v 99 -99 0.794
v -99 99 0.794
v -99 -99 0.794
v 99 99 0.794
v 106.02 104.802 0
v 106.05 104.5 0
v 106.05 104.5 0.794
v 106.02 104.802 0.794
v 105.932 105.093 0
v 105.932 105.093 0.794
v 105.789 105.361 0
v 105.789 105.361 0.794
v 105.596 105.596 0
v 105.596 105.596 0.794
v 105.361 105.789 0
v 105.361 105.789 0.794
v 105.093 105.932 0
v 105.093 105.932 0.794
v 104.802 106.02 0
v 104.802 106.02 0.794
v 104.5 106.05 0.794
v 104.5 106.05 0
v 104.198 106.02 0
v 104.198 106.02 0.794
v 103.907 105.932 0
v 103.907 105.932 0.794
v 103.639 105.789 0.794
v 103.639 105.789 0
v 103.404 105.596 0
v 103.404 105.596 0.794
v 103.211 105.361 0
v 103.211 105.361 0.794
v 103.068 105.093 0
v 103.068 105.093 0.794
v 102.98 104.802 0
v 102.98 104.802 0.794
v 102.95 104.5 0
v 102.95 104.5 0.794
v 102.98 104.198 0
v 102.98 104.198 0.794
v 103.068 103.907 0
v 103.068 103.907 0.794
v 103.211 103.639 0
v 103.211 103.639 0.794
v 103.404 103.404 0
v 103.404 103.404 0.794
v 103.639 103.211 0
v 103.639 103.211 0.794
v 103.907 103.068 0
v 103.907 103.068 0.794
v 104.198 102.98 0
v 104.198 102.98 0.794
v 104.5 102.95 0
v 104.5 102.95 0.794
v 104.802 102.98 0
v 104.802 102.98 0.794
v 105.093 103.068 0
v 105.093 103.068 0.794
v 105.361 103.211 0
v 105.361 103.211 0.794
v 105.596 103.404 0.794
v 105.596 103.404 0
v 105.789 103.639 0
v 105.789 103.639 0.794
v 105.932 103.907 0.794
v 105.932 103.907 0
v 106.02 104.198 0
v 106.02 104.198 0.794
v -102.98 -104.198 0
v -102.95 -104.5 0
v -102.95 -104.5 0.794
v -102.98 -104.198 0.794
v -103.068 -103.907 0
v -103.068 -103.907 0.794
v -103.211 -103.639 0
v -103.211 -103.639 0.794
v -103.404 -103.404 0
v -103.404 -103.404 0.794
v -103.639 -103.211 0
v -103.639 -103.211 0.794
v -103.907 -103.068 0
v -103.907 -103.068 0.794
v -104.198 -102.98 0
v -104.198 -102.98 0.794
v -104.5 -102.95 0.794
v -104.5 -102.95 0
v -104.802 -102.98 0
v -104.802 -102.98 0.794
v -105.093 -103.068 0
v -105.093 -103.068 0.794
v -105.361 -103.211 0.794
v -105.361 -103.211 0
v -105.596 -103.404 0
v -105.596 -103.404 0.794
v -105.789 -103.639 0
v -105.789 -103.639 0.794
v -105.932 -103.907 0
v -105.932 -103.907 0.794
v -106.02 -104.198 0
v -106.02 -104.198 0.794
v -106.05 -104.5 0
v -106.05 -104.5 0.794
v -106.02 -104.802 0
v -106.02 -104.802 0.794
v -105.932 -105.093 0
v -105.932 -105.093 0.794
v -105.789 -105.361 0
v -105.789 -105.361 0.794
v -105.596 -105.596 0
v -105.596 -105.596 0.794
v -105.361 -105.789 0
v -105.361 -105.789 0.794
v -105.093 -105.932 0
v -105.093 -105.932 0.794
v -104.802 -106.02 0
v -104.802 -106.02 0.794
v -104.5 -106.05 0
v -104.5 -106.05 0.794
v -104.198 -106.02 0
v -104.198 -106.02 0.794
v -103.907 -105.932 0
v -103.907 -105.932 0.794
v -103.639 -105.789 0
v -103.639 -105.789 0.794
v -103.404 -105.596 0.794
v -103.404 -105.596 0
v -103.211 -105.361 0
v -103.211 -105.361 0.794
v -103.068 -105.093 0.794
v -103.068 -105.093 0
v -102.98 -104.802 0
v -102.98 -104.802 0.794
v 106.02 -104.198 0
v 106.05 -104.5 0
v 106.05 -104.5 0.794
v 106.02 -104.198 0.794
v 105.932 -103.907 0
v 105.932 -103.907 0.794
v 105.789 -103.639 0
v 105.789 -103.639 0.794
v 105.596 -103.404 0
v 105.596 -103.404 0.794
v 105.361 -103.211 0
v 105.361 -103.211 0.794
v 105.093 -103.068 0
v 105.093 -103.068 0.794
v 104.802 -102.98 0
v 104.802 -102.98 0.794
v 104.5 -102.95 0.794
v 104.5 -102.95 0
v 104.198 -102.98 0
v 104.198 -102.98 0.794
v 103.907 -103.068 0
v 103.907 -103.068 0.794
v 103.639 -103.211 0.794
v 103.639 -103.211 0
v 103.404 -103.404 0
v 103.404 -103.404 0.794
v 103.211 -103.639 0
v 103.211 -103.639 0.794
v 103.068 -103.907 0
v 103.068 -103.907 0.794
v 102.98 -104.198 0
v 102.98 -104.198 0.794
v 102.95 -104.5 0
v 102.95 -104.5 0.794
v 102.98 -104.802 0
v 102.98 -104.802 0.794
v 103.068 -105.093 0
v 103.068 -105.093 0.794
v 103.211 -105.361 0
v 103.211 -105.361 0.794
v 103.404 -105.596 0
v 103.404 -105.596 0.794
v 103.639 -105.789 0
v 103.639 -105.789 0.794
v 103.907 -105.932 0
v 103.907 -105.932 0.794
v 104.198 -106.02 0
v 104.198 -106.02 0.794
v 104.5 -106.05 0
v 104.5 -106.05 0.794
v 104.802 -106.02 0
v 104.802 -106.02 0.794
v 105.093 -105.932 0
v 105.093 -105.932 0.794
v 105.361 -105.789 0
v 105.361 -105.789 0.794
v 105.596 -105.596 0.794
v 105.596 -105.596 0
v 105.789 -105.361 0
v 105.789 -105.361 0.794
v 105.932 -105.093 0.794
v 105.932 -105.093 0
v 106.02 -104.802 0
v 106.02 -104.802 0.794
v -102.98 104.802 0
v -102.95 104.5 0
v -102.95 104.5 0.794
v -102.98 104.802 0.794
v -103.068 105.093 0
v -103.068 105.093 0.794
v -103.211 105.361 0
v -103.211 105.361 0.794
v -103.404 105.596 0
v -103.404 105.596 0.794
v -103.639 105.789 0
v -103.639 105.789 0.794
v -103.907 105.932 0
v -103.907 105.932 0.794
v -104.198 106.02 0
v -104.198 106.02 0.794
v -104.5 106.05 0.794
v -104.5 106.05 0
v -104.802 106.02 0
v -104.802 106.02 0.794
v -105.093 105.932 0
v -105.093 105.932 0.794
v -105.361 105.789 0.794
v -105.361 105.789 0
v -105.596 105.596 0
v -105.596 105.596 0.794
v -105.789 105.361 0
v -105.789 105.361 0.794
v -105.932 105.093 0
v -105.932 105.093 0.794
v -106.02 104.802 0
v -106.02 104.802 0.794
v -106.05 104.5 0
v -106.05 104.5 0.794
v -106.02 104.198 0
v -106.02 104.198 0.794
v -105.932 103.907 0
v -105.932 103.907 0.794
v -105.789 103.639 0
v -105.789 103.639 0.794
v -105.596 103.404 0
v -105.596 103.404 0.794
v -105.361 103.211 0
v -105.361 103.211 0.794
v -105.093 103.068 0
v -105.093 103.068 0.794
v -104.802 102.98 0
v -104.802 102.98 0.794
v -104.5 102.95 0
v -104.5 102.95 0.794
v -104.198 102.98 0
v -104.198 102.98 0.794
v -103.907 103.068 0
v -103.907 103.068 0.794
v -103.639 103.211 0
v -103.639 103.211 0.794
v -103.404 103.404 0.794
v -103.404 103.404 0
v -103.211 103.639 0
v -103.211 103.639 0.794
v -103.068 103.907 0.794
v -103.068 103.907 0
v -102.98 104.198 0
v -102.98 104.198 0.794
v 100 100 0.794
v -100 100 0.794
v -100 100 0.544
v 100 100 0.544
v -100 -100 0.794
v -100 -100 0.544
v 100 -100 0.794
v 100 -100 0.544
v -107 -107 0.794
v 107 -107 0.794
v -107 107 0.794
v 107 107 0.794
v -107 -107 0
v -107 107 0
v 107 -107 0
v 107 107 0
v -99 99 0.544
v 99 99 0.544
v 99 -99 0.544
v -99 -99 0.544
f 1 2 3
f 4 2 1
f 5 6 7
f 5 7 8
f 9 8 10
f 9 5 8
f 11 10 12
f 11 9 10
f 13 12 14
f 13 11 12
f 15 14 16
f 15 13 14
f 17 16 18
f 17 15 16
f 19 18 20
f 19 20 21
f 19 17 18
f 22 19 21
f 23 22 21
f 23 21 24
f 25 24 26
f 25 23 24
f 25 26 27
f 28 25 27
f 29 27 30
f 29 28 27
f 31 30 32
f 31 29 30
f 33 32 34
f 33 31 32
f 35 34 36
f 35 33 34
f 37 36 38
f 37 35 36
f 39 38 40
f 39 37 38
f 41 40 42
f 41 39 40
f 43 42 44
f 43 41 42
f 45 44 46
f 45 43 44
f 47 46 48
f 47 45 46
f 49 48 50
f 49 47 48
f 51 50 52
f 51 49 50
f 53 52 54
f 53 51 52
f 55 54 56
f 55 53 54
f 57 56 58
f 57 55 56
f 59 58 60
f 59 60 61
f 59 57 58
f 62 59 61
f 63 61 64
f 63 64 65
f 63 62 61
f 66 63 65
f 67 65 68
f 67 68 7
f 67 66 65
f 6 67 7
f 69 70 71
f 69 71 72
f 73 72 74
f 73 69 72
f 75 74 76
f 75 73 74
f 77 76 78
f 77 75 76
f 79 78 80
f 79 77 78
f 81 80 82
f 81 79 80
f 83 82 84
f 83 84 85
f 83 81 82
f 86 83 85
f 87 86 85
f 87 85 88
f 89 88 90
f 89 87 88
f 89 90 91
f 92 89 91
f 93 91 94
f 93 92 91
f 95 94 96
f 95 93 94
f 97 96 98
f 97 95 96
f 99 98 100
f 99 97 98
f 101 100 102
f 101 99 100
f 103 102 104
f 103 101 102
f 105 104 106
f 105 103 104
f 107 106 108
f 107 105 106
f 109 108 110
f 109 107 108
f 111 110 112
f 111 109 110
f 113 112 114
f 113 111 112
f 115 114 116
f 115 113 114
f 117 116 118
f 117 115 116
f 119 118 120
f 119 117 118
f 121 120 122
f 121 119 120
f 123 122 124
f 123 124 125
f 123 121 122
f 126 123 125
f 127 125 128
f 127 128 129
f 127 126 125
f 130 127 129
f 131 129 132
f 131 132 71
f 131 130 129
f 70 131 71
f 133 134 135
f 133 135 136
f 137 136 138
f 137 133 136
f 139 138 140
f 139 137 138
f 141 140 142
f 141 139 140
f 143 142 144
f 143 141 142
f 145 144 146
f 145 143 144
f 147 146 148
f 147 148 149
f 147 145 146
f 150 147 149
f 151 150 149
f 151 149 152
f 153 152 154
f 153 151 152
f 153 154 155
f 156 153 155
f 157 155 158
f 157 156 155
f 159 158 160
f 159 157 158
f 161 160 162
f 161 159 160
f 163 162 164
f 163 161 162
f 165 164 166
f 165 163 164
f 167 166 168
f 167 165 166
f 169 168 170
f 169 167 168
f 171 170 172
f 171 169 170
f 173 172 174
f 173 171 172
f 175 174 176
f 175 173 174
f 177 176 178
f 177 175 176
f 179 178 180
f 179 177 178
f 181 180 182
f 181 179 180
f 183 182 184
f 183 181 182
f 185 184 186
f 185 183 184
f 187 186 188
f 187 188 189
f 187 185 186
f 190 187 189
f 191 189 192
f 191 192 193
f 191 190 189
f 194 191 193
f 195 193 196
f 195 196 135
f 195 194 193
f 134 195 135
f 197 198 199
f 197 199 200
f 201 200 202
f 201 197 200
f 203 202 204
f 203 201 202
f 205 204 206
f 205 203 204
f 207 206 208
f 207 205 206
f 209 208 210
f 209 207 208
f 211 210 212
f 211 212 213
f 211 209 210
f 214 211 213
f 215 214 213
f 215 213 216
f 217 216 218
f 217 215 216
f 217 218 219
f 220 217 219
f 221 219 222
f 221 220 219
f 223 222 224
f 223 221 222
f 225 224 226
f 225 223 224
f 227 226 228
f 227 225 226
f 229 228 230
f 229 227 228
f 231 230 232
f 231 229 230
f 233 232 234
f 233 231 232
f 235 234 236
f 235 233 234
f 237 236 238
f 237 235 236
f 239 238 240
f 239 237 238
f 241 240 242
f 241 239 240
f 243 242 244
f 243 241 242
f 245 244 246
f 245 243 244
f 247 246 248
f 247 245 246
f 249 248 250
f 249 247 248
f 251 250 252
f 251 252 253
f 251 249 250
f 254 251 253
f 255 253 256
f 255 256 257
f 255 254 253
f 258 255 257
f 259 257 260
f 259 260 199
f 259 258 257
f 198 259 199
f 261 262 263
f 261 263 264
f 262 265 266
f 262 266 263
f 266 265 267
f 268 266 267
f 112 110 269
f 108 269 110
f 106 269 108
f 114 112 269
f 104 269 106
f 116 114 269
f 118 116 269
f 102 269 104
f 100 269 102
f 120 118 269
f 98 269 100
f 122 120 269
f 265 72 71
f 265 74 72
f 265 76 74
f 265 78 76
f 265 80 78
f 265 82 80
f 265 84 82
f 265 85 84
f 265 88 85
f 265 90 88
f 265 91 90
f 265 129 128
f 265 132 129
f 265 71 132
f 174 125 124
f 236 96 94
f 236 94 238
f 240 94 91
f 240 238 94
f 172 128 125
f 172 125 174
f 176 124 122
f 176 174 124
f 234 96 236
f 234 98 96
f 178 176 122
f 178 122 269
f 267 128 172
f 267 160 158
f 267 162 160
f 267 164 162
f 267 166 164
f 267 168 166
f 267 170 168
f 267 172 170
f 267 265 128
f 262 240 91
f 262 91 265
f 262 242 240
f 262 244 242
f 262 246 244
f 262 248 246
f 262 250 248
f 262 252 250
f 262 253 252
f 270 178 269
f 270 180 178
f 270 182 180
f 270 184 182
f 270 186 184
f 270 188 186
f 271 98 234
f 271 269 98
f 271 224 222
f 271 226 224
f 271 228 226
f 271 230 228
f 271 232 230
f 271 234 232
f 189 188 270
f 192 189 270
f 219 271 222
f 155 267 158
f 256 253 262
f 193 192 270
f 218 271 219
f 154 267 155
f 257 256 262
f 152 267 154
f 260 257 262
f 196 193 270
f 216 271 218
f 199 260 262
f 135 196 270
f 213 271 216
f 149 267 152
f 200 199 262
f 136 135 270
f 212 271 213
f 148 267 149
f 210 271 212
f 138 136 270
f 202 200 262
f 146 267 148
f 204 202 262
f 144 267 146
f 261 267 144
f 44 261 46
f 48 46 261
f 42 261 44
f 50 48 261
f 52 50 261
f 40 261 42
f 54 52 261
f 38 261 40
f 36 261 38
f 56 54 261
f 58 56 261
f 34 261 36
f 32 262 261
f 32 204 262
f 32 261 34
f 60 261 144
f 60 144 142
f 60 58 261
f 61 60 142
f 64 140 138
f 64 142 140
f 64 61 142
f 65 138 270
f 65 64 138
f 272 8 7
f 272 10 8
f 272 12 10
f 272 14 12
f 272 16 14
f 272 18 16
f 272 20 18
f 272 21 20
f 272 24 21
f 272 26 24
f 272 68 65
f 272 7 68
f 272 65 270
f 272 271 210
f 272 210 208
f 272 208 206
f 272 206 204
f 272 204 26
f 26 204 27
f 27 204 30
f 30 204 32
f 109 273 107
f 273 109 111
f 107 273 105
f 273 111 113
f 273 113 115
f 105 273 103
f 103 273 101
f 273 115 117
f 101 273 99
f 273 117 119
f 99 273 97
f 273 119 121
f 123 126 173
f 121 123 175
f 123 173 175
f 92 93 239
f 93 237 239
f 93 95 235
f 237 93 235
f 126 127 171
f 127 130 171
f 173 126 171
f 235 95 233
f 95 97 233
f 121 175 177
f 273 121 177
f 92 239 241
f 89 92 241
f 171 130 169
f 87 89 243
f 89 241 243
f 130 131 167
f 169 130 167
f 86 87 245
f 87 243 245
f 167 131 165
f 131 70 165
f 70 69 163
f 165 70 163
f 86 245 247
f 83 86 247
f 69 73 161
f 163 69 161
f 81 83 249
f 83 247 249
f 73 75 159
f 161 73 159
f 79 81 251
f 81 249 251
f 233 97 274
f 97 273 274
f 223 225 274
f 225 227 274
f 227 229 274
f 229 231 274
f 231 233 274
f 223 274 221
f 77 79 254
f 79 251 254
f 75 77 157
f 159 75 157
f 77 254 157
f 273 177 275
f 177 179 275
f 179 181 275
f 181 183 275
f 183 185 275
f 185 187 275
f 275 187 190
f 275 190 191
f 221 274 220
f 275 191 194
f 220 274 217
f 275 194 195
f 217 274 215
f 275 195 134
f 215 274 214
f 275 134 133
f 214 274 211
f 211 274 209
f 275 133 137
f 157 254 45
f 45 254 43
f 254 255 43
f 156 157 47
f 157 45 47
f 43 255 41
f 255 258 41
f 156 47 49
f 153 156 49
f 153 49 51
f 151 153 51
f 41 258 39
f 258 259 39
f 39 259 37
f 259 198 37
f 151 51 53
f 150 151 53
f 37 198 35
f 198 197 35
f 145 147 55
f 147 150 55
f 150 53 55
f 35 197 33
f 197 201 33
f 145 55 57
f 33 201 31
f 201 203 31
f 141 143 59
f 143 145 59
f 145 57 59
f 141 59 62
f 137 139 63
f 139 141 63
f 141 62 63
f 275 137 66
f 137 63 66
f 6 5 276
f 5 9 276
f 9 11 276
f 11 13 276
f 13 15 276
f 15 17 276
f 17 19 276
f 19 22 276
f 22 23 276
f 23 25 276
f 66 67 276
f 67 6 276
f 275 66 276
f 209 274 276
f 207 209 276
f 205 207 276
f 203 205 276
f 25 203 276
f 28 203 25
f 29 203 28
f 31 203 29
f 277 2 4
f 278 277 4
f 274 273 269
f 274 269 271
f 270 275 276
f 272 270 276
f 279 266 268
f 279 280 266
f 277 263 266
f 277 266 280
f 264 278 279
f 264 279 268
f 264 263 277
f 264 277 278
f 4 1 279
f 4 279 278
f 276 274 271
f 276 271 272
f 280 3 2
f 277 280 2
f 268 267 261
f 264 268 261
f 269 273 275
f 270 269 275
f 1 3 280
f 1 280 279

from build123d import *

# Parameters (mm, degrees)
F0_W     = 214
F0_H     = 214
F0_R     = 1.55
F1_DEPTH = 0.79375
F2_W     = 200
F2_H     = 200
F2_W_2   = 198
F2_H_2   = 198
F3_DEPTH = 0.25


with BuildPart() as f1:
    # F0 (on Top) → F1 (new body)
    with BuildSketch(Plane.XY):
        Rectangle(F0_W, F0_H)
        with Locations((-104.5, -104.5)):
            Circle(F0_R, mode=Mode.SUBTRACT)
        with Locations((104.5, -104.5)):
            Circle(F0_R, mode=Mode.SUBTRACT)
        with Locations((-104.5, 104.5)):
            Circle(F0_R, mode=Mode.SUBTRACT)
        with Locations((104.5, 104.5)):
            Circle(F0_R, mode=Mode.SUBTRACT)
    extrude(amount=F1_DEPTH)

    # F2 (on face) → F3 (cut, symmetric)
    with BuildSketch(Plane.XY.offset(0.79375)):
        Rectangle(F2_W, F2_H)
        Rectangle(F2_W_2, F2_H_2, mode=Mode.SUBTRACT)
    extrude(amount=F3_DEPTH, both=True, mode=Mode.SUBTRACT)


solid = f1.part
